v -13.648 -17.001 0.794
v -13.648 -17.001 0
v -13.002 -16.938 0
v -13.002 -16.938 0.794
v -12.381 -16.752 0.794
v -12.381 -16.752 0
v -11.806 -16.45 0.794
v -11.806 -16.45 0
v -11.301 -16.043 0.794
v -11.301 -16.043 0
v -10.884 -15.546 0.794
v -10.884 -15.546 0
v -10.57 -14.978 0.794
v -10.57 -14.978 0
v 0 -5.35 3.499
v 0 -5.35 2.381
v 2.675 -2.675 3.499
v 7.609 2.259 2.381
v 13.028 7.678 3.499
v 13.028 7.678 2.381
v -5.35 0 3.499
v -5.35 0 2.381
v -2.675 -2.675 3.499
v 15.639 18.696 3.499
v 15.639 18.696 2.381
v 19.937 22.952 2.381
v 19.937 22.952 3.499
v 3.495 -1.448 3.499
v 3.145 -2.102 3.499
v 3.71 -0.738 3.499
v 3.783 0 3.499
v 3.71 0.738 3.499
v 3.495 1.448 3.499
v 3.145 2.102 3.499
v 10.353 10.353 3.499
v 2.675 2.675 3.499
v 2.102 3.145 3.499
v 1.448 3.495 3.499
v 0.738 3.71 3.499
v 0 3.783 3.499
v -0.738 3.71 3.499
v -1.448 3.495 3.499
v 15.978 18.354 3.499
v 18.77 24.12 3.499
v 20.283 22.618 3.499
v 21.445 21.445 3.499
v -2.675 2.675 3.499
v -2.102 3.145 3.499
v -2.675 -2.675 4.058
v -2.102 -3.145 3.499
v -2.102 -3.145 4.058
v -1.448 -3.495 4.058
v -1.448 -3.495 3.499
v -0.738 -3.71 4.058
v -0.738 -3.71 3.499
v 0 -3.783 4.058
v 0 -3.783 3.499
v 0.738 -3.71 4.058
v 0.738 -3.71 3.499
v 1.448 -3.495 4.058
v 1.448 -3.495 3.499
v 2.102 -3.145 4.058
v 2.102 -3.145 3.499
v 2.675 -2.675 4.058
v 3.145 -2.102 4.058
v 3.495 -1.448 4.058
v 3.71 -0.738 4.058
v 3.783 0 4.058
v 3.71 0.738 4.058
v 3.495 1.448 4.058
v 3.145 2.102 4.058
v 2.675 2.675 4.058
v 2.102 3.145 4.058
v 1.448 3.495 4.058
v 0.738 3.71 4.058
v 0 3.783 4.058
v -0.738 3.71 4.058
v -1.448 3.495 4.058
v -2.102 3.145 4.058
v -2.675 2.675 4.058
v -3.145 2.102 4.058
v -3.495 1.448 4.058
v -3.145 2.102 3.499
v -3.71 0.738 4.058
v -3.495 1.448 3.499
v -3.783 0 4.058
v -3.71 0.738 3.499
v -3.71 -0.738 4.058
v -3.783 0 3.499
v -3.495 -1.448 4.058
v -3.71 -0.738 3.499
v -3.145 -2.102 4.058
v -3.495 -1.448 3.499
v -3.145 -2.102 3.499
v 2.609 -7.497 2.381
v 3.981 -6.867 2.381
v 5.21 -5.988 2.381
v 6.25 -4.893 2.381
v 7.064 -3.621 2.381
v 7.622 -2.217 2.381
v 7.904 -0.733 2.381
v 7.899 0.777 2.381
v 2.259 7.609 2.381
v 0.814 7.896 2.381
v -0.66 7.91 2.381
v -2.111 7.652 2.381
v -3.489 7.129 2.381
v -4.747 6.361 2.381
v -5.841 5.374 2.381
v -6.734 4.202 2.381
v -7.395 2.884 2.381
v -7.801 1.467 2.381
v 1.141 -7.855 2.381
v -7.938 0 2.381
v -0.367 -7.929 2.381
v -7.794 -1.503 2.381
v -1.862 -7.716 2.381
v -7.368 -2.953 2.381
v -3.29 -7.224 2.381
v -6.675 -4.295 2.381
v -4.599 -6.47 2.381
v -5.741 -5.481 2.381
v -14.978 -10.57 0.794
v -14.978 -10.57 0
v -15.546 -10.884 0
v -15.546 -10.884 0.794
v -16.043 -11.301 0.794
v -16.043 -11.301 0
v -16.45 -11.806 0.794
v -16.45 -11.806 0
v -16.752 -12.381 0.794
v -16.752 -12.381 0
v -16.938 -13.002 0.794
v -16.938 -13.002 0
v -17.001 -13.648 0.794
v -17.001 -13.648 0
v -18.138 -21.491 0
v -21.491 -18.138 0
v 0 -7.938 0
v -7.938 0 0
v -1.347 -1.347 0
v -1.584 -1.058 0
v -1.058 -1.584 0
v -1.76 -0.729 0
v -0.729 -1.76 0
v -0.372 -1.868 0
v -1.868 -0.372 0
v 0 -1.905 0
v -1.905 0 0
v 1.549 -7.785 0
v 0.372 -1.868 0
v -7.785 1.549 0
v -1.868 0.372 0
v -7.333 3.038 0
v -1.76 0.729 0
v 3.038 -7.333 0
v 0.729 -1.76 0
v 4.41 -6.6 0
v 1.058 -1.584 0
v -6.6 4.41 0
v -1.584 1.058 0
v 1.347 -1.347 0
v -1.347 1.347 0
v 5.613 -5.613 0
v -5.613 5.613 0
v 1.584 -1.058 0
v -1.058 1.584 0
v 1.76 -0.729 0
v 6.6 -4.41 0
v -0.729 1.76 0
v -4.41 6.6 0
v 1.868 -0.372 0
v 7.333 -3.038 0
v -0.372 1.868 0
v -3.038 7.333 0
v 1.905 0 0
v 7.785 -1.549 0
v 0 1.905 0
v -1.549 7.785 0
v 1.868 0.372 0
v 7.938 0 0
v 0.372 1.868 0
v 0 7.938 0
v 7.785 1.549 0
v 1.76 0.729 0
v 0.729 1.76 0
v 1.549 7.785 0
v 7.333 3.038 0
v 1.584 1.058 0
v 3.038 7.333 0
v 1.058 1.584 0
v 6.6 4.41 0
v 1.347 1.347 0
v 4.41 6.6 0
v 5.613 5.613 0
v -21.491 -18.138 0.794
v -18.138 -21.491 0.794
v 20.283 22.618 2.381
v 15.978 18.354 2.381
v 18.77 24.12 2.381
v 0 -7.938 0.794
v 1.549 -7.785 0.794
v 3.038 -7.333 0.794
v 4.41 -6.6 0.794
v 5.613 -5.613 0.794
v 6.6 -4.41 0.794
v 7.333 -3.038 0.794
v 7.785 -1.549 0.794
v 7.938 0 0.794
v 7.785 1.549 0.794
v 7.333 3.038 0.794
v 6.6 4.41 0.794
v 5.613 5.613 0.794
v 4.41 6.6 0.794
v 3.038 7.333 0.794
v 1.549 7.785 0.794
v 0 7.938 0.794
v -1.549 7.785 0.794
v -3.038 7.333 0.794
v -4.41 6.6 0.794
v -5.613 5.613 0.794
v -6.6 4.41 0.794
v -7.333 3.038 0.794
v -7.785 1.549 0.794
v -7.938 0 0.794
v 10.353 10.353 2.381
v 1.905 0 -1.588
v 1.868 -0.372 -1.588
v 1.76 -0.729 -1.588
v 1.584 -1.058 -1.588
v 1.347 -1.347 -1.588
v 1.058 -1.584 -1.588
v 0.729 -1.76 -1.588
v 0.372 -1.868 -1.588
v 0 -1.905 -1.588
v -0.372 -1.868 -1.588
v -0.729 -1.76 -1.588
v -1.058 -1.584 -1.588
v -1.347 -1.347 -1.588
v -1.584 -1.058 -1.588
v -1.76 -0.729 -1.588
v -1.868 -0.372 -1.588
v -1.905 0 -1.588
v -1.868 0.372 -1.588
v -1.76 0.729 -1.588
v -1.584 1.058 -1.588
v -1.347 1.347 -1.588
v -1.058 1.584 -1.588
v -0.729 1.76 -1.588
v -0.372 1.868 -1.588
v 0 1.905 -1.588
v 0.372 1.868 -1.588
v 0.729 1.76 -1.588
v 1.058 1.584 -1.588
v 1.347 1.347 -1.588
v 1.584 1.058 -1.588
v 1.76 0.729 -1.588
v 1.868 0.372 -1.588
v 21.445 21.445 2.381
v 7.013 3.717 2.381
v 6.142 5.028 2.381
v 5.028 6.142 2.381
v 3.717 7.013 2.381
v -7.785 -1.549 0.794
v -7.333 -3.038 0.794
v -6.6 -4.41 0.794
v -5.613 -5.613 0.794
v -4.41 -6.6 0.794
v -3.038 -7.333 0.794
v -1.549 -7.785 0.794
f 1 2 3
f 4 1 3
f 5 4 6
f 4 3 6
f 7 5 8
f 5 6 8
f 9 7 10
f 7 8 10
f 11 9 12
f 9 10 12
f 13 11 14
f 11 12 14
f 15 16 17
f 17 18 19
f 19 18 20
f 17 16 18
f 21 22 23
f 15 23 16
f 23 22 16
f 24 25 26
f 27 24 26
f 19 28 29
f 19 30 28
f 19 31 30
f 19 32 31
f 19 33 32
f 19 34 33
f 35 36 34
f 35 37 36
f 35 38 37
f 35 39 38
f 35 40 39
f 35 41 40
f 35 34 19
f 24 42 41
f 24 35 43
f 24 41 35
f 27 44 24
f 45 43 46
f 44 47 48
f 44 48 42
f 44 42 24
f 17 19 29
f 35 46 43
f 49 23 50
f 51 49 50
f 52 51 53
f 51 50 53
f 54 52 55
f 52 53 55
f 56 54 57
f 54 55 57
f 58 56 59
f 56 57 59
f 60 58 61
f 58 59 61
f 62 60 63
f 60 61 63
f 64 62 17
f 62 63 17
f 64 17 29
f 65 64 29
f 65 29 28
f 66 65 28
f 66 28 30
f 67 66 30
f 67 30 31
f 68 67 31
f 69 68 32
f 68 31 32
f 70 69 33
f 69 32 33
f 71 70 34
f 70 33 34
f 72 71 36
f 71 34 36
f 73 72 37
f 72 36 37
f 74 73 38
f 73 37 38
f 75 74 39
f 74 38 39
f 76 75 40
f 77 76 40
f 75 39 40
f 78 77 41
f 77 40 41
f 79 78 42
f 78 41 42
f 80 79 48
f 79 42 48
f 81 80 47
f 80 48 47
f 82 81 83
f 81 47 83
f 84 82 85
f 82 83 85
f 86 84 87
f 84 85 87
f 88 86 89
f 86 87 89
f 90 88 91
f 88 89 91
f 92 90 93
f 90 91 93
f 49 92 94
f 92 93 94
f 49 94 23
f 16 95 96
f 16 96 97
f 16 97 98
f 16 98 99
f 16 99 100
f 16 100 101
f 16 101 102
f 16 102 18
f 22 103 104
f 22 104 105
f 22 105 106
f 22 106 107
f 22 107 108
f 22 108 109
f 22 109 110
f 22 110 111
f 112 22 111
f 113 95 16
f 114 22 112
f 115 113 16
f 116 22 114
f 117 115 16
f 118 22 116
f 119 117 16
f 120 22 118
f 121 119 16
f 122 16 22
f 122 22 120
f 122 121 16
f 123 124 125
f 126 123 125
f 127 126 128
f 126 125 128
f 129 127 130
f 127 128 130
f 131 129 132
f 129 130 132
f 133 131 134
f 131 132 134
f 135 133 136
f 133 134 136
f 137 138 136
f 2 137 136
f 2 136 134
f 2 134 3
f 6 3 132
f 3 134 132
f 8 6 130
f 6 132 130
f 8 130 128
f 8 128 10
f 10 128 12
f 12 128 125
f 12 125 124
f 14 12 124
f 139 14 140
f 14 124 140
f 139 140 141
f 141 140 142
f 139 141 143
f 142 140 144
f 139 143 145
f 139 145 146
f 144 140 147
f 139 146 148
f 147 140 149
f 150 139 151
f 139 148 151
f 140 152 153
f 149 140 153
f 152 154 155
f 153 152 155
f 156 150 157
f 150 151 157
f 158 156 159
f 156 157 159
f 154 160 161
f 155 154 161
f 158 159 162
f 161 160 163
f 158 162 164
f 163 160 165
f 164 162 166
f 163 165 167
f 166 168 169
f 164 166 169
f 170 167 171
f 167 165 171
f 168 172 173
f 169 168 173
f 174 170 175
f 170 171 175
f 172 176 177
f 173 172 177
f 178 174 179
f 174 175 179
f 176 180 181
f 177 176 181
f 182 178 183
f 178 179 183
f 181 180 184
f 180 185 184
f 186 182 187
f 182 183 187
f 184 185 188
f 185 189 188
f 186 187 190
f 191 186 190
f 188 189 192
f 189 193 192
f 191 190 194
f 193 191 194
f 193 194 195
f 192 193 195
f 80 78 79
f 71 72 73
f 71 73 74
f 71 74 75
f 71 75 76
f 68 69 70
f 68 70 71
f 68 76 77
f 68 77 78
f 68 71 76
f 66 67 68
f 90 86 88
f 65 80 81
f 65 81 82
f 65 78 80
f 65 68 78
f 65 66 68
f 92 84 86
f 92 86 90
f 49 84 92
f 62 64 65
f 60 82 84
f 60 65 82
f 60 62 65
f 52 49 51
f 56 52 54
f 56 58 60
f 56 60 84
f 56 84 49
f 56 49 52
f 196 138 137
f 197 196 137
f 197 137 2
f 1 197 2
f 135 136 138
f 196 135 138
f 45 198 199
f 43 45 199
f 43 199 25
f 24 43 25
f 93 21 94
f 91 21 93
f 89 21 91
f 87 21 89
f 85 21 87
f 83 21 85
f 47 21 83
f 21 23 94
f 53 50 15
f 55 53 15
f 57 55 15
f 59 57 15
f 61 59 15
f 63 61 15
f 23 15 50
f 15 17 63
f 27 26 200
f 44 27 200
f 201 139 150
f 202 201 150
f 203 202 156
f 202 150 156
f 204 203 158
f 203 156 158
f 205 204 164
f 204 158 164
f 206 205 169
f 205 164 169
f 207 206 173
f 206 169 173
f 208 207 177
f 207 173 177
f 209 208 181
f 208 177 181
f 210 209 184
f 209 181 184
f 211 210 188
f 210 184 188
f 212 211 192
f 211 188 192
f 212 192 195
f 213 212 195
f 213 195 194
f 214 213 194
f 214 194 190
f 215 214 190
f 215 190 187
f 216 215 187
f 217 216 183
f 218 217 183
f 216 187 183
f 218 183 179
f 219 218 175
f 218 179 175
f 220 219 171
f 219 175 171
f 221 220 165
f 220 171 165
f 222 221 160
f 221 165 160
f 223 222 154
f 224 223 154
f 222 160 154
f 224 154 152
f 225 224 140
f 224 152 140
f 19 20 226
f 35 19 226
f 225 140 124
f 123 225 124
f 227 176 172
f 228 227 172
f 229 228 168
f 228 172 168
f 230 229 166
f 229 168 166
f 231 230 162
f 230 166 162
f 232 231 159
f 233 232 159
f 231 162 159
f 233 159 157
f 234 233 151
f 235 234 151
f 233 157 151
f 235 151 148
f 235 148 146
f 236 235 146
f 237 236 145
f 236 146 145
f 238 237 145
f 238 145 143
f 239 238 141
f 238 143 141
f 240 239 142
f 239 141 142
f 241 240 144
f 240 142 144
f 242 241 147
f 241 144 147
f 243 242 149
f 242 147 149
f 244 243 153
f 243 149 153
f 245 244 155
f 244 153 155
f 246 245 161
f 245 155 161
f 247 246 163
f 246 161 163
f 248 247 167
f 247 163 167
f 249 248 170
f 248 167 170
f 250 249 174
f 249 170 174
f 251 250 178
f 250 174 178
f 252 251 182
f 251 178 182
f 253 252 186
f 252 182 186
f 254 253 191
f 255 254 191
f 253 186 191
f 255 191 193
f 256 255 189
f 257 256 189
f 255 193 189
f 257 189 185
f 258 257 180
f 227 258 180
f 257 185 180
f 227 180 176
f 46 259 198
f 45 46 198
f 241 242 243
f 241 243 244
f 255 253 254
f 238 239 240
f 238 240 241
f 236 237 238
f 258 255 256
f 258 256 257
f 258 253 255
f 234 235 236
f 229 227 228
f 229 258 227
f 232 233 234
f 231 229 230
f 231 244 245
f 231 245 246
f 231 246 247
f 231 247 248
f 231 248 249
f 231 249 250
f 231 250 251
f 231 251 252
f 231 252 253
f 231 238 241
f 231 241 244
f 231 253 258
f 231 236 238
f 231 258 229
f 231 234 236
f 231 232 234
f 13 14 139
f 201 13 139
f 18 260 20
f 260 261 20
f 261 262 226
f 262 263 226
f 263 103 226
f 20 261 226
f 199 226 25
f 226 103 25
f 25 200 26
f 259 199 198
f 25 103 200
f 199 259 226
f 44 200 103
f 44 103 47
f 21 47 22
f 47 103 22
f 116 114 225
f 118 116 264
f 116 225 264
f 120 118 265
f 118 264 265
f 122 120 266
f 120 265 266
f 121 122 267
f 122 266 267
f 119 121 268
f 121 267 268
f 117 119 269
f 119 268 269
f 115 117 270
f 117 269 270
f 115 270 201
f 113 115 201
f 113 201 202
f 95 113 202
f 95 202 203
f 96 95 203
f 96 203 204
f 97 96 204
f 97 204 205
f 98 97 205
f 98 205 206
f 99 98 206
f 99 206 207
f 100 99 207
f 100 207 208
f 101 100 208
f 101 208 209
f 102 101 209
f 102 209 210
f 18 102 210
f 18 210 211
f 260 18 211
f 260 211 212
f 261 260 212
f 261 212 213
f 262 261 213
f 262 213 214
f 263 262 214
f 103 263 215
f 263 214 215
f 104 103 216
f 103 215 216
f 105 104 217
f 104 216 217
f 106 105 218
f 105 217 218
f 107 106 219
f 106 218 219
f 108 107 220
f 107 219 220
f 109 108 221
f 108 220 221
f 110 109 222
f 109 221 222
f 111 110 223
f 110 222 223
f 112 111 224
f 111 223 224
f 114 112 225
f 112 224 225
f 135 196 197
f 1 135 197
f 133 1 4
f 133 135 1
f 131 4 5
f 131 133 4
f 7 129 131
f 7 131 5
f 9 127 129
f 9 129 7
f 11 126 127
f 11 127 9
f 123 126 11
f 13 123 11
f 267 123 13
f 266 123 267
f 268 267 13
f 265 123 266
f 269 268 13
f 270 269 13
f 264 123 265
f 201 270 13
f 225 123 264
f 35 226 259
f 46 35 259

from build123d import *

# Parameters (mm, degrees)
BOSS_EXTRUDE1_DEPTH = 0.79375
SKETCH3_R           = 7.9375
BOSS_EXTRUDE2_DEPTH = 1.5875
BOSS_EXTRUDE3_DEPTH = 1.1176
SKETCH5_R           = 3.7830125
BOSS_EXTRUDE4_DEPTH = 0.5588
SKETCH7_R           = 1.905
BOSS_EXTRUDE5_DEPTH = 1.5875


with BuildPart() as part:
    # Sketch2 → Boss-Extrude1 (new body)
    with BuildSketch(Plane.XY):
        with BuildLine():
            Line((-10.570159202, -14.977509548), (0, -7.9375))
            ThreePointArc((0, -7.9375), (5.612660076, 5.612660076), (-7.9375, 0))
            Line((-7.9375, 0), (-14.977509548, -10.570159202))
            ThreePointArc((-14.977509548, -10.570159202), (-16.449796179, -11.80639255), (-17.00096249, -13.64816249))
            Line((-17.00096249, -13.64816249), (-21.49109055, -18.13829055))
            Line((-21.49109055, -18.13829055), (-18.13829055, -21.49109055))
            Line((-18.13829055, -21.49109055), (-13.64816249, -17.00096249))
            ThreePointArc((-13.64816249, -17.00096249), (-11.80639255, -16.449796179), (-10.570159202, -14.977509548))
        make_face()
    extrude(amount=BOSS_EXTRUDE1_DEPTH)

    # Sketch3 → Boss-Extrude2 (add)
    with BuildSketch(Plane.XY.offset(0.79375)):
        with Locations(Location((0, 0, 0), (0, 0, 180))):
            Circle(SKETCH3_R)
    extrude(amount=BOSS_EXTRUDE2_DEPTH)

    # Sketch4 → Boss-Extrude3 (add)
    with BuildSketch(Plane.XY.offset(2.38125)):
        Polygon((-5.349987584, 0), (0, -5.349987584), (13.027765396, 7.677777811), (10.352771604, 10.352771604), (21.444773795, 21.444773795), (20.283005592, 22.617844825), (15.977877039, 18.354197239), (15.63941792, 18.695949223), (19.937213299, 22.952334291), (18.769780003, 24.119767587), align=None)
    extrude(amount=BOSS_EXTRUDE3_DEPTH)

    # Sketch5 → Boss-Extrude4 (add)
    with BuildSketch(Plane.XY.offset(3.49885)):
        with Locations(Location((0, 0, 0), (0, 0, 225))):
            Circle(SKETCH5_R)
    extrude(amount=BOSS_EXTRUDE4_DEPTH)

    # Sketch7 → Boss-Extrude5 (add)
    with BuildSketch(Plane(origin=(0, 0, 0), x_dir=(-1, 0, 0), z_dir=(0, 0, -1))):
        with Locations(Location((0, 0, 0), (0, 0, 180))):
            Circle(SKETCH7_R)
    extrude(amount=BOSS_EXTRUDE5_DEPTH)


solid = part.part
